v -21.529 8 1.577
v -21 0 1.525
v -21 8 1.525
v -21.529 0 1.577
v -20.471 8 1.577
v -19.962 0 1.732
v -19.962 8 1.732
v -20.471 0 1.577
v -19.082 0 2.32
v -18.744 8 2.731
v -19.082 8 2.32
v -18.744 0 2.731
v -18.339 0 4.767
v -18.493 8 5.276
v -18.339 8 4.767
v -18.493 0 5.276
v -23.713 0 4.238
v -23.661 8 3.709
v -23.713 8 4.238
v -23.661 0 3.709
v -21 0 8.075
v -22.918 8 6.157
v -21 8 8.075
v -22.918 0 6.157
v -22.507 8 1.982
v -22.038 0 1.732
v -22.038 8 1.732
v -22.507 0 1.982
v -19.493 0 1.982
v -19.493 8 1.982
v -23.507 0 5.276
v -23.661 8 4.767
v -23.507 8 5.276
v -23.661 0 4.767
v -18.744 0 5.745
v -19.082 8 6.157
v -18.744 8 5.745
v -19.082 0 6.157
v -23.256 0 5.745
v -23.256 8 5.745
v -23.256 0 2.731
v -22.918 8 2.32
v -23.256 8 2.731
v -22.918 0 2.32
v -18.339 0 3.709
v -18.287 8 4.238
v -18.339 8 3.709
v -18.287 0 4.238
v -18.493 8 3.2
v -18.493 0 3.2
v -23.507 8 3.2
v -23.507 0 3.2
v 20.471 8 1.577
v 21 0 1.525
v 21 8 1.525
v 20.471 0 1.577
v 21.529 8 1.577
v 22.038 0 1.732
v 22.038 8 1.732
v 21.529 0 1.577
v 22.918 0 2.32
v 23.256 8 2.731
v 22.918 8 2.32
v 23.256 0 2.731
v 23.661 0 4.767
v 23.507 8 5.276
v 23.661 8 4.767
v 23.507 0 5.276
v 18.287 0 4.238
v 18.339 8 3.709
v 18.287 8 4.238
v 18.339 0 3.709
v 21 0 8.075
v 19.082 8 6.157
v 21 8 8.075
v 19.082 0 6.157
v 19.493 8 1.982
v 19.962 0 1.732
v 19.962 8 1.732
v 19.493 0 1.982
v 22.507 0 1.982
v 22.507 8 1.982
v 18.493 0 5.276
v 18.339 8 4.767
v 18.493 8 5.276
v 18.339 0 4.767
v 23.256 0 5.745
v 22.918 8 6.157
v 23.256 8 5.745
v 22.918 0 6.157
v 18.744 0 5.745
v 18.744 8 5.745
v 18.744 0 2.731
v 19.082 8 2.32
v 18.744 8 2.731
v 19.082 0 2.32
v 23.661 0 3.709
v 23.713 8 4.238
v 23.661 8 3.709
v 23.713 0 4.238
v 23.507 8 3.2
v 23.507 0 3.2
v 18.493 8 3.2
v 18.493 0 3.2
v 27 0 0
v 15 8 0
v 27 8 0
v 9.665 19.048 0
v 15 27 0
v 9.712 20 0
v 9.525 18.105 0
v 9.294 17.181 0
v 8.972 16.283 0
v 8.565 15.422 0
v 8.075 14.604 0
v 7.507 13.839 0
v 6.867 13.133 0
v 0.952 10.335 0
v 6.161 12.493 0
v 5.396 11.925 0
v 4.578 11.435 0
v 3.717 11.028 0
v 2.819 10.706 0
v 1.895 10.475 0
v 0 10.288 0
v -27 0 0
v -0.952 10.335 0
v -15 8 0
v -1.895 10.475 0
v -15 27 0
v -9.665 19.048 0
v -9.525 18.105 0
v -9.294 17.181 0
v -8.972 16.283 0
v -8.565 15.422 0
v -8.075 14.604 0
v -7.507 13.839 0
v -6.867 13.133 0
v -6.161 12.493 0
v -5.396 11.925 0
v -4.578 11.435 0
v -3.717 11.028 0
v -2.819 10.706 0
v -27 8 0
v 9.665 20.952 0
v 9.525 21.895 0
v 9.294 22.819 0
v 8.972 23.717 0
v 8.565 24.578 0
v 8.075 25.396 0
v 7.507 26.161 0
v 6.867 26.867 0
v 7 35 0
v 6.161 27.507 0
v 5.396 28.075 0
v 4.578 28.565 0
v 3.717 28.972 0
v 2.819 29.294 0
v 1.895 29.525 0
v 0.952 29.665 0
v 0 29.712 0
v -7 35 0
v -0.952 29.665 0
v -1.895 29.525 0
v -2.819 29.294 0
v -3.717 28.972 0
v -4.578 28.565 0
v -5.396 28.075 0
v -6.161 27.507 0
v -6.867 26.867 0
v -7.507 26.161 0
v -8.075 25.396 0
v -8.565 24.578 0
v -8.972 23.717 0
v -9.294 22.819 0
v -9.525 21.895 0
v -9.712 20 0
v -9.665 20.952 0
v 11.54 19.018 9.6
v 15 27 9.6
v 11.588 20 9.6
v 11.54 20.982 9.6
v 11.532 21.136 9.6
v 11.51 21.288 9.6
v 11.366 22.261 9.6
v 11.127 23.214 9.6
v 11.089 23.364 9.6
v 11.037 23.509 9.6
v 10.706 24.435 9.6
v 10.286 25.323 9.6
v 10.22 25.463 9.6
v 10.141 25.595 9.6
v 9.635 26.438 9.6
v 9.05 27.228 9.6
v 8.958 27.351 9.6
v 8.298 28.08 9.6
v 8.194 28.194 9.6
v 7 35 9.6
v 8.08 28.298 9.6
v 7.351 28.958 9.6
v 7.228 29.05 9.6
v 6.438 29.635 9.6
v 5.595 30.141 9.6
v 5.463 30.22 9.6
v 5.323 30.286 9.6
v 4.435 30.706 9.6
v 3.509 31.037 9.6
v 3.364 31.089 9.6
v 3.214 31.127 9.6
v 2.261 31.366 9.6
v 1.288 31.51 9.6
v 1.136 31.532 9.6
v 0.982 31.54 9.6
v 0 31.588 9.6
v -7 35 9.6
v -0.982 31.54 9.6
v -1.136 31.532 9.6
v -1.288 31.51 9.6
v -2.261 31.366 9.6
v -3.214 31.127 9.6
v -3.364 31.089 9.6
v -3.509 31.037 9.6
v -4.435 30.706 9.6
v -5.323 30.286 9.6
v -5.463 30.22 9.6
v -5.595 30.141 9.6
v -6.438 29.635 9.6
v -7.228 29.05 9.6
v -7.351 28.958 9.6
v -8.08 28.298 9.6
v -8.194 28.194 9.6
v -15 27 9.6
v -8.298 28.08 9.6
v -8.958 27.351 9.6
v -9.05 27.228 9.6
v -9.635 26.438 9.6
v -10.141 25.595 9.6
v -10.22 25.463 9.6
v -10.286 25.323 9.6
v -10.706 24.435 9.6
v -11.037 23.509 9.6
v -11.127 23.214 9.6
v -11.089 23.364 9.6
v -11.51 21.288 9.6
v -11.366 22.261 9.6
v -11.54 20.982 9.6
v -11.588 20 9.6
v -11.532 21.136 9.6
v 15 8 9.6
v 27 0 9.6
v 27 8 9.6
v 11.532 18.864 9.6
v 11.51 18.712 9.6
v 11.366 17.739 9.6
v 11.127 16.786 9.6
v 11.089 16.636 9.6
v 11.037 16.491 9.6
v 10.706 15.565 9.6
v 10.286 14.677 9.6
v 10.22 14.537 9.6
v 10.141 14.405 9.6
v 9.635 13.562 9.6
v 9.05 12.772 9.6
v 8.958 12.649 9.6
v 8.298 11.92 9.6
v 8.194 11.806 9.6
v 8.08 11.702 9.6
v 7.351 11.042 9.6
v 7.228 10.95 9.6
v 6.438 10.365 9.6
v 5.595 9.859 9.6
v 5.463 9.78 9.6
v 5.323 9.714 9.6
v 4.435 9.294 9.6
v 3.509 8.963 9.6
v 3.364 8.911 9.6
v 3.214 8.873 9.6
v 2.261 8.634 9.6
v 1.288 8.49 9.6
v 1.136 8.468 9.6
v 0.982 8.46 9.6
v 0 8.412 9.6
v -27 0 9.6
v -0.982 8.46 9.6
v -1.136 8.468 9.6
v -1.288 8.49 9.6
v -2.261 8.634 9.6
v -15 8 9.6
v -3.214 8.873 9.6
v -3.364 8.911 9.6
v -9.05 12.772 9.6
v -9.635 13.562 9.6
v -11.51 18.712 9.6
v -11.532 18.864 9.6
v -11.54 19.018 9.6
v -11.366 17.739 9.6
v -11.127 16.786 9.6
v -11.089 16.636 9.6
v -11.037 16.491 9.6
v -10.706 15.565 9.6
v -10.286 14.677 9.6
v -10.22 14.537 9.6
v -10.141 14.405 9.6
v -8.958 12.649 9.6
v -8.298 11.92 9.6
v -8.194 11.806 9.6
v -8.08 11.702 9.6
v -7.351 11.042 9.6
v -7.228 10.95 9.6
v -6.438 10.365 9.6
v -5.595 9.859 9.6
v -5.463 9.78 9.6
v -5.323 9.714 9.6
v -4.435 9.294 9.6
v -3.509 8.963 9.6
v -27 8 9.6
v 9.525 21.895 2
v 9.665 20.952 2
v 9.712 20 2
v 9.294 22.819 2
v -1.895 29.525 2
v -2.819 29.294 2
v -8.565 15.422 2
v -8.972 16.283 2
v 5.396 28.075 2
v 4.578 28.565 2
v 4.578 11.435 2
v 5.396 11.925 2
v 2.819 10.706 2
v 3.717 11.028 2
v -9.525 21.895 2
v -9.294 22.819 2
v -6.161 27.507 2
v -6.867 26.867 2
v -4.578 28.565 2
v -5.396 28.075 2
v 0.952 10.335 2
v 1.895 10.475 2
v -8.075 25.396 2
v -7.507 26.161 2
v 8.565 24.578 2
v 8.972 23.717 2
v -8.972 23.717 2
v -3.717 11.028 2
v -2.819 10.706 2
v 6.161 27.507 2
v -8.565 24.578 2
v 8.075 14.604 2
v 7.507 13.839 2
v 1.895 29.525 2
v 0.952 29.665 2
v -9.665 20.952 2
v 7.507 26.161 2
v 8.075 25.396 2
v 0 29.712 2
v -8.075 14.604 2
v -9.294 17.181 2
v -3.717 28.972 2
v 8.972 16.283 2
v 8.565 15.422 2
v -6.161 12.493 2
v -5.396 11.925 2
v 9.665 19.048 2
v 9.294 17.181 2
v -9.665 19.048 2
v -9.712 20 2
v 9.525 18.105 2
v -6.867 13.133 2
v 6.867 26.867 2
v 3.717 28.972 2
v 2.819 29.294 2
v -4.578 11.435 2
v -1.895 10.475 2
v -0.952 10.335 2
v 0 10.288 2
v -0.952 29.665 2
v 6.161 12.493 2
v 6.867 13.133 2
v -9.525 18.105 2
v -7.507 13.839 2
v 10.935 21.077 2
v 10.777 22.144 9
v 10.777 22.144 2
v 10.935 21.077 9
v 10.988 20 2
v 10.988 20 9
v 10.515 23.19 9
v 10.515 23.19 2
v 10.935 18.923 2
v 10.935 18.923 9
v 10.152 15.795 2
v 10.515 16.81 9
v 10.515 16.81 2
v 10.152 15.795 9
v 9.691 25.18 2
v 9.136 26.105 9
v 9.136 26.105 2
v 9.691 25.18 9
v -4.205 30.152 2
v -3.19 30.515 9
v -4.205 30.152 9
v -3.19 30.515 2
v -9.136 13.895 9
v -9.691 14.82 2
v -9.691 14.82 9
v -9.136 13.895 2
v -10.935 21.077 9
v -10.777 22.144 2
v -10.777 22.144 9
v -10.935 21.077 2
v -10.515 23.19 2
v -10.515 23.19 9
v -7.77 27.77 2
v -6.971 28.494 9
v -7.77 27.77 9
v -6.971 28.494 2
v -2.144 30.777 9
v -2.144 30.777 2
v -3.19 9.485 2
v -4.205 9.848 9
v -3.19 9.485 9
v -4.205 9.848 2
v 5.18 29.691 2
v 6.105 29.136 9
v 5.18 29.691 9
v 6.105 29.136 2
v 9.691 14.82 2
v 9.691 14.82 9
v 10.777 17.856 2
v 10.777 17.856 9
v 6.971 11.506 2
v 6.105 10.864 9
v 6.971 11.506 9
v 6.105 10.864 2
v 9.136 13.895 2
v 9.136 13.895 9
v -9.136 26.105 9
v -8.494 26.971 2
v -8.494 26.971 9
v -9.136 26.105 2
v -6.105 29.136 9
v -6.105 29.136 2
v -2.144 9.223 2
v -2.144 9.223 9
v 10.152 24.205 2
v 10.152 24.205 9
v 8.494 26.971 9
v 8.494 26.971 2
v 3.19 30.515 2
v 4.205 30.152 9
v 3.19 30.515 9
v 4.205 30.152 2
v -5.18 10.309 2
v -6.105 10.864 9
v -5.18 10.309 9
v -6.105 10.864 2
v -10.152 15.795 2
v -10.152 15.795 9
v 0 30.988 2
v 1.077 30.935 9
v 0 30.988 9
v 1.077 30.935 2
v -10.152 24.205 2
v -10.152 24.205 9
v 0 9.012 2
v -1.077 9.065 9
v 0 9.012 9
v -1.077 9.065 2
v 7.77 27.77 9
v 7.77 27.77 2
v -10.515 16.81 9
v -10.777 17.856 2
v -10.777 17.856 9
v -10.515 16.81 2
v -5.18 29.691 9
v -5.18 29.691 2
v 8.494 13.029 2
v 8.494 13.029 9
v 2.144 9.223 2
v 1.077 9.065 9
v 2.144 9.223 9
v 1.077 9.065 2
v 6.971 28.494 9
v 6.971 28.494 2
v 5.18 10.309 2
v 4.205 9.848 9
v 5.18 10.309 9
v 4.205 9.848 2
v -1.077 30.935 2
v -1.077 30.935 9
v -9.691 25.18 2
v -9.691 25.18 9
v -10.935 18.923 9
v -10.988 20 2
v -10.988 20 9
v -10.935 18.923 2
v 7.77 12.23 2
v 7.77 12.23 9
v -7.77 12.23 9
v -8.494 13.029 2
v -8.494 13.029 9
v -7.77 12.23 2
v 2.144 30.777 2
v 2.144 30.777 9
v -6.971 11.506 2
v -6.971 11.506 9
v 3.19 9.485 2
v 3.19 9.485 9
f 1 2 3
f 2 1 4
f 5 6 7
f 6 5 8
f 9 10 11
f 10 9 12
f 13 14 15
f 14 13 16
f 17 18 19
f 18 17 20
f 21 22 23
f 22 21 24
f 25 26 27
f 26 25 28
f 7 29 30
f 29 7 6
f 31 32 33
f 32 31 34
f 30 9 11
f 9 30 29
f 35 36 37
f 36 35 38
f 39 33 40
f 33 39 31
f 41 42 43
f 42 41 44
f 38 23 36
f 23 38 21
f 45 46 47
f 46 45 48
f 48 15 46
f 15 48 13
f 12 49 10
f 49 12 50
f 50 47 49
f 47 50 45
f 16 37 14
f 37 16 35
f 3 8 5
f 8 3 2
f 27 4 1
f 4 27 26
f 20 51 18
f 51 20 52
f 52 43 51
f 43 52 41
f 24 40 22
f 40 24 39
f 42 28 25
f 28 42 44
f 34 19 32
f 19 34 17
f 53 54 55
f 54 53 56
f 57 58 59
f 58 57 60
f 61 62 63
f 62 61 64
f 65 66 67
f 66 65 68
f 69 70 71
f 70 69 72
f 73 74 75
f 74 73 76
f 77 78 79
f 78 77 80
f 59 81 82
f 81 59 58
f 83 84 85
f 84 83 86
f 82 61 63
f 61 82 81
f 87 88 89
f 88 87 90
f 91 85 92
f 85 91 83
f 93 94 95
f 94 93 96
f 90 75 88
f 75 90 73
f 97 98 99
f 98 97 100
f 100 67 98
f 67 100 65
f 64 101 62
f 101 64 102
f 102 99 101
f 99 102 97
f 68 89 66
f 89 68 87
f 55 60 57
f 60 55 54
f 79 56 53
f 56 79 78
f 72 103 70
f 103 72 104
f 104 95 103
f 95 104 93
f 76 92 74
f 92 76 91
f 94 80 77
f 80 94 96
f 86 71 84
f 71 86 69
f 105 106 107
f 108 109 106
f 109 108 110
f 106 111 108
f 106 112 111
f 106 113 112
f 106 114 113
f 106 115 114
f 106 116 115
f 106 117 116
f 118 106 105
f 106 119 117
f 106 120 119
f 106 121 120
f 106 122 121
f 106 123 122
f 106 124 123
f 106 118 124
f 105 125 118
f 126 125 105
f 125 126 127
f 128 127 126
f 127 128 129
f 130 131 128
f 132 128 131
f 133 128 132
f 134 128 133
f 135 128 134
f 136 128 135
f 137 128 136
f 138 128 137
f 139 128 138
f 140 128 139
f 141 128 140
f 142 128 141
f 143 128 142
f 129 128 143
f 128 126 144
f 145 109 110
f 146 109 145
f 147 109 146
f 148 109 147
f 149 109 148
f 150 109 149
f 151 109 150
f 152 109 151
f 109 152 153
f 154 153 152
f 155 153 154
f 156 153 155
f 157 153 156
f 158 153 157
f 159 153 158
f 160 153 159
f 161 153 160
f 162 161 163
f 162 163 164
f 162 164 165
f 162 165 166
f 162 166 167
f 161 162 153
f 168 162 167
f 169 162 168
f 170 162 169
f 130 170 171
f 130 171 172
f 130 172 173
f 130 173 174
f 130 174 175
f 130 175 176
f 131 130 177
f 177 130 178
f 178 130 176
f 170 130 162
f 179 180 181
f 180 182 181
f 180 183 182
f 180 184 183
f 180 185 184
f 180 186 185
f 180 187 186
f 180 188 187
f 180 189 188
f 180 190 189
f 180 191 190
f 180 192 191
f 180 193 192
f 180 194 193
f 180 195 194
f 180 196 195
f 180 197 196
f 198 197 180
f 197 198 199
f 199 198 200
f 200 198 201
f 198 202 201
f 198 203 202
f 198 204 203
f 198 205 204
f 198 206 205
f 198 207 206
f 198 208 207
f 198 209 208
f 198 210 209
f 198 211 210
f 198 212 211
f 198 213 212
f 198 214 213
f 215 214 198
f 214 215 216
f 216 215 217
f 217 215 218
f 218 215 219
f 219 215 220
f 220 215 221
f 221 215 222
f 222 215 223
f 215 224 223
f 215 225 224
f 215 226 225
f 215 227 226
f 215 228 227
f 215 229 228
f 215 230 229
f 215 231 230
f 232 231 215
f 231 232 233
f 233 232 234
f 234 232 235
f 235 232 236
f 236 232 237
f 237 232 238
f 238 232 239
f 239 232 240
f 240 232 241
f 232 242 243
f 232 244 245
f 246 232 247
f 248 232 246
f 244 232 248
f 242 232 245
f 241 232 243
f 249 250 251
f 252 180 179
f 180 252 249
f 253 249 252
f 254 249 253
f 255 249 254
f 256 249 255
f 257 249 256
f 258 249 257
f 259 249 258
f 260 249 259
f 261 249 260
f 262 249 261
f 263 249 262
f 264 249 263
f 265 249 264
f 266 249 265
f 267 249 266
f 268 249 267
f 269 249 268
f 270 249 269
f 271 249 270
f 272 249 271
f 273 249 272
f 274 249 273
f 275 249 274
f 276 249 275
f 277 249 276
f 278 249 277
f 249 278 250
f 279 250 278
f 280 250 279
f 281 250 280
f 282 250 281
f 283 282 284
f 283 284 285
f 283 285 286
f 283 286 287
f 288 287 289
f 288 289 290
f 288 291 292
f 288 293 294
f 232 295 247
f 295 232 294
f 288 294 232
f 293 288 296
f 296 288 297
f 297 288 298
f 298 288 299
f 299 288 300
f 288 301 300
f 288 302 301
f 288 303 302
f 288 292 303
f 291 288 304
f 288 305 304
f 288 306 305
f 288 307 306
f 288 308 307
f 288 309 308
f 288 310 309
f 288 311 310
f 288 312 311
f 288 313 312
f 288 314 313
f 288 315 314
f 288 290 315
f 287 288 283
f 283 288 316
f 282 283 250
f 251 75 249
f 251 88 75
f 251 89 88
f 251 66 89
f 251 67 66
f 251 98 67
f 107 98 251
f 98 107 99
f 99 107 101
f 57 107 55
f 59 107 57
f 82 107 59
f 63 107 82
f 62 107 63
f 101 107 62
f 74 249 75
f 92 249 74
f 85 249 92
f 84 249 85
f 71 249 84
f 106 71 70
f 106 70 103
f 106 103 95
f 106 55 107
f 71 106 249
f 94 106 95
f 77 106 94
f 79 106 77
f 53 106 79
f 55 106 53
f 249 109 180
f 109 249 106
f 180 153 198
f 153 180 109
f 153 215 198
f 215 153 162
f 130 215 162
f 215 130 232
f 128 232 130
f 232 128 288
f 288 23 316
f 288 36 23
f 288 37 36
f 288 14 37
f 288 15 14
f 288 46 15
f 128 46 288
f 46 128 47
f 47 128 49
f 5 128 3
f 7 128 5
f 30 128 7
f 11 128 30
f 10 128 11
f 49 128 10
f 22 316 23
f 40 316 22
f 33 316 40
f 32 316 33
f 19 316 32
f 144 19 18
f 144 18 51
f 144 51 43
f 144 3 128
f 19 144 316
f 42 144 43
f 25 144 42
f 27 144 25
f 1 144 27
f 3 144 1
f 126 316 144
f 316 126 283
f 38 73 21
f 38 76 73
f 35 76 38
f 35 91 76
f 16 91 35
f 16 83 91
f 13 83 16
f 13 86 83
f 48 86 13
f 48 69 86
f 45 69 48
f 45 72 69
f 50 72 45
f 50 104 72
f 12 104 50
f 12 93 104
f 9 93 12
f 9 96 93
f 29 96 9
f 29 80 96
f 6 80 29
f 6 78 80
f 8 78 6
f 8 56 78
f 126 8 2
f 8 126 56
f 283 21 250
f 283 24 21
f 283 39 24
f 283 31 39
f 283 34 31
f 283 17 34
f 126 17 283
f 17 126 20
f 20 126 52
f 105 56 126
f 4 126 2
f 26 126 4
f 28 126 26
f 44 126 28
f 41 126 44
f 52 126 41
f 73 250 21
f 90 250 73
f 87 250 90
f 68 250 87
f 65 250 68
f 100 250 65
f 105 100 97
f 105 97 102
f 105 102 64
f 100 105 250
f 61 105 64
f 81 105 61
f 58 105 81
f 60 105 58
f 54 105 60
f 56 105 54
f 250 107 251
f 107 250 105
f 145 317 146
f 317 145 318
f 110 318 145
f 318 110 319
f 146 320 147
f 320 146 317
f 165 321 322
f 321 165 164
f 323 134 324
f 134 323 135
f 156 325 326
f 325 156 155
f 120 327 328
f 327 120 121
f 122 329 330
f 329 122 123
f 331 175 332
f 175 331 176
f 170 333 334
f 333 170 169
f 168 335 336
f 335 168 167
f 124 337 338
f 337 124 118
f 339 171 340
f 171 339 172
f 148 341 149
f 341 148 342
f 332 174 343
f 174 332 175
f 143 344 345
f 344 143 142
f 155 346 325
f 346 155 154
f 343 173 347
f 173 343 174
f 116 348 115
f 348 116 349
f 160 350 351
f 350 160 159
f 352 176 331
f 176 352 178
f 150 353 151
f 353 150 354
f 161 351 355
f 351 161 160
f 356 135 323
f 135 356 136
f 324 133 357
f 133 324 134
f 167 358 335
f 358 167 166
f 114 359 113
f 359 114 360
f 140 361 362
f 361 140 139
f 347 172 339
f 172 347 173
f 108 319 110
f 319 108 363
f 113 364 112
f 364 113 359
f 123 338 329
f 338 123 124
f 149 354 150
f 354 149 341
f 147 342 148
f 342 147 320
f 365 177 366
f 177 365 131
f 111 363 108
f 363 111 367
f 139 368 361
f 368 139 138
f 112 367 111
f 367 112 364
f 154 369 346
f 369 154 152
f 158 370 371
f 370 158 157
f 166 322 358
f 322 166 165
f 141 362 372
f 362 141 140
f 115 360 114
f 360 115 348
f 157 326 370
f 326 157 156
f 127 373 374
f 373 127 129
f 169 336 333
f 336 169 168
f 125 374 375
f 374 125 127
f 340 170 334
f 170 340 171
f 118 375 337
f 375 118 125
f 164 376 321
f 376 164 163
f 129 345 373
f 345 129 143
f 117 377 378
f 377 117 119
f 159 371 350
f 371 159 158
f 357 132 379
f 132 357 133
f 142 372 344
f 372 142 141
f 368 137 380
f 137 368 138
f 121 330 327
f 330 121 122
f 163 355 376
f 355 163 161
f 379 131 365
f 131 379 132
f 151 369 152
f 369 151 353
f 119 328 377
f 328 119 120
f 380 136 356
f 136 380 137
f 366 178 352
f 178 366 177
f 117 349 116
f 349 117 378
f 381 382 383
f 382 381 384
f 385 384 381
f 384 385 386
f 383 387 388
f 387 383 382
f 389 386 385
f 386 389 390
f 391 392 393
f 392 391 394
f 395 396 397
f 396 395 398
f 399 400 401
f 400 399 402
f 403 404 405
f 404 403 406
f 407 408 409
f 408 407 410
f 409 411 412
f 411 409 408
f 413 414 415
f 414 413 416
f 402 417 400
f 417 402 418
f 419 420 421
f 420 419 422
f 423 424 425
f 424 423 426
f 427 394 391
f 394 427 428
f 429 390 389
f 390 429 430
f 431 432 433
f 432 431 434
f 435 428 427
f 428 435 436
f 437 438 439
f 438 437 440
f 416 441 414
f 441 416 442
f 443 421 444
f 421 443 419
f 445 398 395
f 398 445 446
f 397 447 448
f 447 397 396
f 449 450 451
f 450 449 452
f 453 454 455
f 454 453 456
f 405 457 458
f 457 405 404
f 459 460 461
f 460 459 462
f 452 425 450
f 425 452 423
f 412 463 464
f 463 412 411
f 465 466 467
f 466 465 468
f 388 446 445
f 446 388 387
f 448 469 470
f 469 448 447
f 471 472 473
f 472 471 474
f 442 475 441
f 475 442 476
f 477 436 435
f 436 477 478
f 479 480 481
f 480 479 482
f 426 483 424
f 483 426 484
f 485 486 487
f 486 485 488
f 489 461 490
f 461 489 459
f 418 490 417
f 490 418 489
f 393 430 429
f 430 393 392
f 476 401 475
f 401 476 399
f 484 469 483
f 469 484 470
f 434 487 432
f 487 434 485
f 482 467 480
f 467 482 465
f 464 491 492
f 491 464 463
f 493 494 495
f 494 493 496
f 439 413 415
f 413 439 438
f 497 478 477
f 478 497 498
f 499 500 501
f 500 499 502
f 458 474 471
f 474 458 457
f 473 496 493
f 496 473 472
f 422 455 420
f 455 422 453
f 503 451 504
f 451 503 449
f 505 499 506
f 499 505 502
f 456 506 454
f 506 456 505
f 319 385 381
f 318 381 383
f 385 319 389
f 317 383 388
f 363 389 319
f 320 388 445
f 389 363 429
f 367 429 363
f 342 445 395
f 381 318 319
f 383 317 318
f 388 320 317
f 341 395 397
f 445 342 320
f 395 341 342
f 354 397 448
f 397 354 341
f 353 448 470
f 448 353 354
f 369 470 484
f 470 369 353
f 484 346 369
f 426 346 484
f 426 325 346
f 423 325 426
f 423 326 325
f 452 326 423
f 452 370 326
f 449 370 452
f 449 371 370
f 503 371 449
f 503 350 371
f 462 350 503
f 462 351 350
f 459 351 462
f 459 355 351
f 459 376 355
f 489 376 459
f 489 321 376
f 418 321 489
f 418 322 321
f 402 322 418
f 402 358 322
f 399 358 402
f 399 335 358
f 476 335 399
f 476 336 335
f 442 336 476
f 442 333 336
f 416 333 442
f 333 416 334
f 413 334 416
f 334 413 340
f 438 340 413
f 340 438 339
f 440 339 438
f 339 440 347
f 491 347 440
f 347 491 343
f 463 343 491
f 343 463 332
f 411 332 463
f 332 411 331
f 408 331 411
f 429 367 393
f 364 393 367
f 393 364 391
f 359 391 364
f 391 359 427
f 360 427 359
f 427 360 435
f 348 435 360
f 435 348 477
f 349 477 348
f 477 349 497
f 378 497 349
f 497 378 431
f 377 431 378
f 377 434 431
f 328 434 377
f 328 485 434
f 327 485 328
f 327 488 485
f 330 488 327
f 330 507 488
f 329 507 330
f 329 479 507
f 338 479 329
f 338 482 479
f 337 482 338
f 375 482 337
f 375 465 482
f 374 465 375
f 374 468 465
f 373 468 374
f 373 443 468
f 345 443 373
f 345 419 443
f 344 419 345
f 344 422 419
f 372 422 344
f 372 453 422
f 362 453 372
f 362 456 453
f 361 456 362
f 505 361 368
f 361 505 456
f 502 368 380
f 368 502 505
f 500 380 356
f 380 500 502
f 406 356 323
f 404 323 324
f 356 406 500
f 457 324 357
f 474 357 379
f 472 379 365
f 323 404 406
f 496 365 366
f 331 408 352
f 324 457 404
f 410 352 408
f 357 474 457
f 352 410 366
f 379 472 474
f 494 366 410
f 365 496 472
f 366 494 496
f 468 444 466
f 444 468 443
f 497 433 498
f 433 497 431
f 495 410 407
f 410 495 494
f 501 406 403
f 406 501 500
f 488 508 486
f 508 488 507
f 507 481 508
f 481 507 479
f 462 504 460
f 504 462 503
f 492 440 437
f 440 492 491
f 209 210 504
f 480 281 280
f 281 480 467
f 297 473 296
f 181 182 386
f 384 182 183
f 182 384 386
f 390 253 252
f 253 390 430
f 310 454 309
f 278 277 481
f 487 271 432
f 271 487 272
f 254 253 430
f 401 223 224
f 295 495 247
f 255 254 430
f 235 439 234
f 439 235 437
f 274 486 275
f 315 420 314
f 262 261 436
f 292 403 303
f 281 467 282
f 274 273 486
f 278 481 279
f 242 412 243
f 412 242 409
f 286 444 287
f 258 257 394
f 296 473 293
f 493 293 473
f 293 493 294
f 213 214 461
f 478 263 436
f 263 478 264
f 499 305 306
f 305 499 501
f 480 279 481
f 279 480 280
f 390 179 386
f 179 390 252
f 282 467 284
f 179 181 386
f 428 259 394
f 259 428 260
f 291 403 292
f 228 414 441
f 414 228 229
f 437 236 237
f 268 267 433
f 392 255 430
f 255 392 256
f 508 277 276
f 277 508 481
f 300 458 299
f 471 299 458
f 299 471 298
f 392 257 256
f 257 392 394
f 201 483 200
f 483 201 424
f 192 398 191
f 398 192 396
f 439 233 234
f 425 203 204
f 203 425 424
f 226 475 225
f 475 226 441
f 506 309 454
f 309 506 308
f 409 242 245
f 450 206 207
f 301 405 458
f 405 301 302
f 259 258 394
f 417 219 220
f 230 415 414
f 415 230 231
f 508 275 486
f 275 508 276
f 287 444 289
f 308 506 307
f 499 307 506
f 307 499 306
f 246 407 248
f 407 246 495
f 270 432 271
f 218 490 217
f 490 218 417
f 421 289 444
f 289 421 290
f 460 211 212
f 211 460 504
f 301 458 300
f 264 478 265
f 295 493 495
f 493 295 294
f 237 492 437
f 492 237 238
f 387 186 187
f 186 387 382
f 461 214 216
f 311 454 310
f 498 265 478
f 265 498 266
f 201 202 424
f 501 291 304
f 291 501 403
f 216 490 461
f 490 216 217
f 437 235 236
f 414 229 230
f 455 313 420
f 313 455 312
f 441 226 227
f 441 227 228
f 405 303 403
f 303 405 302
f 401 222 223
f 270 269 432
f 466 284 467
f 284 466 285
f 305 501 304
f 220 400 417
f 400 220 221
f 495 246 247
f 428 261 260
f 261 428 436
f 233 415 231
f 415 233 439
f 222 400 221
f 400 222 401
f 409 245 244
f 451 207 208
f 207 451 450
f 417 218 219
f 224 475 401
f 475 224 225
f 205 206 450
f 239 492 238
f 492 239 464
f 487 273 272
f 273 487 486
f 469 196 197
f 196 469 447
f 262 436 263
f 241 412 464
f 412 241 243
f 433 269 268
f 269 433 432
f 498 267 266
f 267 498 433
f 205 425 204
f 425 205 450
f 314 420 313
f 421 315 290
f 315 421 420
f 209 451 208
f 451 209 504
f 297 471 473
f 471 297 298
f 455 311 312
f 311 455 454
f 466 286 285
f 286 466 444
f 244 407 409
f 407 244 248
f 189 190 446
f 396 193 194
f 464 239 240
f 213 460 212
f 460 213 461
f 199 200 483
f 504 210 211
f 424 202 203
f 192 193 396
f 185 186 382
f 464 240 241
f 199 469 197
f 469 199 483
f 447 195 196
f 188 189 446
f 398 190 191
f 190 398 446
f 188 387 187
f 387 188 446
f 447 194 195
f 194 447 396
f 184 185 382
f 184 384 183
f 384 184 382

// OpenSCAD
// 608 pillow block for a light spool axle: bearing 8 x 22 x 7 mm.
// Print as shown, bearing axis vertical and pocket mouth up; no supports.
// In service rotate onto its long bottom edge; two M5 bolts secure the feet.
// Print two blocks for an 8 mm axle. Use shaft collars/spacers at the INNER
// races to retain the axle; this open press-fit seat is for radial loads.
// Insert bearing from above, pressing only its outer race onto the shoulder.
// Tune seat_allowance with your printer/material: negative = interference,
// positive = clearance. Default: 0.05 mm diametral interference at facet
// flats (less at vertices); print a fit sample before pressing in a bearing.
// Shoulder opening clears the seal/inner race; top cone guides insertion.
// Source: SKF 608 drawing, https://docs.rs-online.com/9931/A700000008717780.pdf

bearing_od = 22; // 608 outside diameter, mm [22:0.1:22]
bearing_width = 7; // 608 width, mm [7:0.1:7]
seat_allowance = -0.05; // Added pocket diameter, mm [-0.1:0.05:0.4]
shoulder_opening = 19.4; // Through opening under outer race, mm [19.4:0.1:19.4]
shoulder_thickness = 2; // Axial retaining shoulder, mm [1.6:0.2:3]
lead_in = 0.6; // 45-degree insertion chamfer depth, mm [0.4:0.1:1]
radial_wall = 4; // Material outside bearing seat, mm [3:0.5:6]
axis_height = 20; // Axle centre above mounting surface, mm [19:1:26]
foot_extension = 12; // Foot width beyond bearing body, mm [11:1:16]
foot_height = 8; // Height of mounting feet in service, mm [7:1:9]
mount_screw = 5; // Mount screw nominal diameter, mm [3:2:5]
hole_clearance = 0.4; // Added mount-hole diameter, mm [0.2:0.05:0.4]
$fn = 64; // Bearing seat facets [48:8:96]

half_body = bearing_od/2+radial_wall;
half_width = half_body+foot_extension;
// Centre the asymmetric teardrop by its full height, keeping both skins >=1.2.
mount_radius = (mount_screw+hole_clearance)/(2*cos(180/32));
depth = max(shoulder_thickness+bearing_width+lead_in,
            2.4+mount_radius*(1+sqrt(2)));
mount_axis_z = (depth-mount_radius*(sqrt(2)-1))/2;
top = axis_height+half_body;
// Circumscribed polygon compensates for facet flats at the bearing seat.
seat_diameter = (bearing_od+seat_allowance)/cos(180/$fn);

module mounting_hole() {
    radius = mount_radius;
    linear_extrude(height=foot_height+2)
        union() {
            circle(r=radius,$fn=32);
            polygon([[-radius/sqrt(2),radius/sqrt(2)],
                     [0,radius*sqrt(2)], [radius/sqrt(2),radius/sqrt(2)]]);
        }
}

color("#f0965a") difference() {
    linear_extrude(height=depth)
        polygon([[-half_width,0], [half_width,0], [half_width,foot_height],
                 [half_body,foot_height], [half_body,top-8],
                 [half_body-8,top], [-half_body+8,top],
                 [-half_body,top-8], [-half_body,foot_height],
                 [-half_width,foot_height]]);
    translate([0,axis_height,-1])
        cylinder(h=depth+2,d=shoulder_opening/cos(180/$fn));
    translate([0,axis_height,shoulder_thickness])
        cylinder(h=depth-shoulder_thickness+1,d=seat_diameter);
    translate([0,axis_height,depth-lead_in])
        cylinder(h=lead_in+0.1,d1=seat_diameter,d2=seat_diameter+2*(lead_in+0.1));
    for (x = [-half_body-foot_extension/2,half_body+foot_extension/2])
        translate([x,foot_height+1,mount_axis_z]) rotate([90,0,0]) mounting_hole();
}
